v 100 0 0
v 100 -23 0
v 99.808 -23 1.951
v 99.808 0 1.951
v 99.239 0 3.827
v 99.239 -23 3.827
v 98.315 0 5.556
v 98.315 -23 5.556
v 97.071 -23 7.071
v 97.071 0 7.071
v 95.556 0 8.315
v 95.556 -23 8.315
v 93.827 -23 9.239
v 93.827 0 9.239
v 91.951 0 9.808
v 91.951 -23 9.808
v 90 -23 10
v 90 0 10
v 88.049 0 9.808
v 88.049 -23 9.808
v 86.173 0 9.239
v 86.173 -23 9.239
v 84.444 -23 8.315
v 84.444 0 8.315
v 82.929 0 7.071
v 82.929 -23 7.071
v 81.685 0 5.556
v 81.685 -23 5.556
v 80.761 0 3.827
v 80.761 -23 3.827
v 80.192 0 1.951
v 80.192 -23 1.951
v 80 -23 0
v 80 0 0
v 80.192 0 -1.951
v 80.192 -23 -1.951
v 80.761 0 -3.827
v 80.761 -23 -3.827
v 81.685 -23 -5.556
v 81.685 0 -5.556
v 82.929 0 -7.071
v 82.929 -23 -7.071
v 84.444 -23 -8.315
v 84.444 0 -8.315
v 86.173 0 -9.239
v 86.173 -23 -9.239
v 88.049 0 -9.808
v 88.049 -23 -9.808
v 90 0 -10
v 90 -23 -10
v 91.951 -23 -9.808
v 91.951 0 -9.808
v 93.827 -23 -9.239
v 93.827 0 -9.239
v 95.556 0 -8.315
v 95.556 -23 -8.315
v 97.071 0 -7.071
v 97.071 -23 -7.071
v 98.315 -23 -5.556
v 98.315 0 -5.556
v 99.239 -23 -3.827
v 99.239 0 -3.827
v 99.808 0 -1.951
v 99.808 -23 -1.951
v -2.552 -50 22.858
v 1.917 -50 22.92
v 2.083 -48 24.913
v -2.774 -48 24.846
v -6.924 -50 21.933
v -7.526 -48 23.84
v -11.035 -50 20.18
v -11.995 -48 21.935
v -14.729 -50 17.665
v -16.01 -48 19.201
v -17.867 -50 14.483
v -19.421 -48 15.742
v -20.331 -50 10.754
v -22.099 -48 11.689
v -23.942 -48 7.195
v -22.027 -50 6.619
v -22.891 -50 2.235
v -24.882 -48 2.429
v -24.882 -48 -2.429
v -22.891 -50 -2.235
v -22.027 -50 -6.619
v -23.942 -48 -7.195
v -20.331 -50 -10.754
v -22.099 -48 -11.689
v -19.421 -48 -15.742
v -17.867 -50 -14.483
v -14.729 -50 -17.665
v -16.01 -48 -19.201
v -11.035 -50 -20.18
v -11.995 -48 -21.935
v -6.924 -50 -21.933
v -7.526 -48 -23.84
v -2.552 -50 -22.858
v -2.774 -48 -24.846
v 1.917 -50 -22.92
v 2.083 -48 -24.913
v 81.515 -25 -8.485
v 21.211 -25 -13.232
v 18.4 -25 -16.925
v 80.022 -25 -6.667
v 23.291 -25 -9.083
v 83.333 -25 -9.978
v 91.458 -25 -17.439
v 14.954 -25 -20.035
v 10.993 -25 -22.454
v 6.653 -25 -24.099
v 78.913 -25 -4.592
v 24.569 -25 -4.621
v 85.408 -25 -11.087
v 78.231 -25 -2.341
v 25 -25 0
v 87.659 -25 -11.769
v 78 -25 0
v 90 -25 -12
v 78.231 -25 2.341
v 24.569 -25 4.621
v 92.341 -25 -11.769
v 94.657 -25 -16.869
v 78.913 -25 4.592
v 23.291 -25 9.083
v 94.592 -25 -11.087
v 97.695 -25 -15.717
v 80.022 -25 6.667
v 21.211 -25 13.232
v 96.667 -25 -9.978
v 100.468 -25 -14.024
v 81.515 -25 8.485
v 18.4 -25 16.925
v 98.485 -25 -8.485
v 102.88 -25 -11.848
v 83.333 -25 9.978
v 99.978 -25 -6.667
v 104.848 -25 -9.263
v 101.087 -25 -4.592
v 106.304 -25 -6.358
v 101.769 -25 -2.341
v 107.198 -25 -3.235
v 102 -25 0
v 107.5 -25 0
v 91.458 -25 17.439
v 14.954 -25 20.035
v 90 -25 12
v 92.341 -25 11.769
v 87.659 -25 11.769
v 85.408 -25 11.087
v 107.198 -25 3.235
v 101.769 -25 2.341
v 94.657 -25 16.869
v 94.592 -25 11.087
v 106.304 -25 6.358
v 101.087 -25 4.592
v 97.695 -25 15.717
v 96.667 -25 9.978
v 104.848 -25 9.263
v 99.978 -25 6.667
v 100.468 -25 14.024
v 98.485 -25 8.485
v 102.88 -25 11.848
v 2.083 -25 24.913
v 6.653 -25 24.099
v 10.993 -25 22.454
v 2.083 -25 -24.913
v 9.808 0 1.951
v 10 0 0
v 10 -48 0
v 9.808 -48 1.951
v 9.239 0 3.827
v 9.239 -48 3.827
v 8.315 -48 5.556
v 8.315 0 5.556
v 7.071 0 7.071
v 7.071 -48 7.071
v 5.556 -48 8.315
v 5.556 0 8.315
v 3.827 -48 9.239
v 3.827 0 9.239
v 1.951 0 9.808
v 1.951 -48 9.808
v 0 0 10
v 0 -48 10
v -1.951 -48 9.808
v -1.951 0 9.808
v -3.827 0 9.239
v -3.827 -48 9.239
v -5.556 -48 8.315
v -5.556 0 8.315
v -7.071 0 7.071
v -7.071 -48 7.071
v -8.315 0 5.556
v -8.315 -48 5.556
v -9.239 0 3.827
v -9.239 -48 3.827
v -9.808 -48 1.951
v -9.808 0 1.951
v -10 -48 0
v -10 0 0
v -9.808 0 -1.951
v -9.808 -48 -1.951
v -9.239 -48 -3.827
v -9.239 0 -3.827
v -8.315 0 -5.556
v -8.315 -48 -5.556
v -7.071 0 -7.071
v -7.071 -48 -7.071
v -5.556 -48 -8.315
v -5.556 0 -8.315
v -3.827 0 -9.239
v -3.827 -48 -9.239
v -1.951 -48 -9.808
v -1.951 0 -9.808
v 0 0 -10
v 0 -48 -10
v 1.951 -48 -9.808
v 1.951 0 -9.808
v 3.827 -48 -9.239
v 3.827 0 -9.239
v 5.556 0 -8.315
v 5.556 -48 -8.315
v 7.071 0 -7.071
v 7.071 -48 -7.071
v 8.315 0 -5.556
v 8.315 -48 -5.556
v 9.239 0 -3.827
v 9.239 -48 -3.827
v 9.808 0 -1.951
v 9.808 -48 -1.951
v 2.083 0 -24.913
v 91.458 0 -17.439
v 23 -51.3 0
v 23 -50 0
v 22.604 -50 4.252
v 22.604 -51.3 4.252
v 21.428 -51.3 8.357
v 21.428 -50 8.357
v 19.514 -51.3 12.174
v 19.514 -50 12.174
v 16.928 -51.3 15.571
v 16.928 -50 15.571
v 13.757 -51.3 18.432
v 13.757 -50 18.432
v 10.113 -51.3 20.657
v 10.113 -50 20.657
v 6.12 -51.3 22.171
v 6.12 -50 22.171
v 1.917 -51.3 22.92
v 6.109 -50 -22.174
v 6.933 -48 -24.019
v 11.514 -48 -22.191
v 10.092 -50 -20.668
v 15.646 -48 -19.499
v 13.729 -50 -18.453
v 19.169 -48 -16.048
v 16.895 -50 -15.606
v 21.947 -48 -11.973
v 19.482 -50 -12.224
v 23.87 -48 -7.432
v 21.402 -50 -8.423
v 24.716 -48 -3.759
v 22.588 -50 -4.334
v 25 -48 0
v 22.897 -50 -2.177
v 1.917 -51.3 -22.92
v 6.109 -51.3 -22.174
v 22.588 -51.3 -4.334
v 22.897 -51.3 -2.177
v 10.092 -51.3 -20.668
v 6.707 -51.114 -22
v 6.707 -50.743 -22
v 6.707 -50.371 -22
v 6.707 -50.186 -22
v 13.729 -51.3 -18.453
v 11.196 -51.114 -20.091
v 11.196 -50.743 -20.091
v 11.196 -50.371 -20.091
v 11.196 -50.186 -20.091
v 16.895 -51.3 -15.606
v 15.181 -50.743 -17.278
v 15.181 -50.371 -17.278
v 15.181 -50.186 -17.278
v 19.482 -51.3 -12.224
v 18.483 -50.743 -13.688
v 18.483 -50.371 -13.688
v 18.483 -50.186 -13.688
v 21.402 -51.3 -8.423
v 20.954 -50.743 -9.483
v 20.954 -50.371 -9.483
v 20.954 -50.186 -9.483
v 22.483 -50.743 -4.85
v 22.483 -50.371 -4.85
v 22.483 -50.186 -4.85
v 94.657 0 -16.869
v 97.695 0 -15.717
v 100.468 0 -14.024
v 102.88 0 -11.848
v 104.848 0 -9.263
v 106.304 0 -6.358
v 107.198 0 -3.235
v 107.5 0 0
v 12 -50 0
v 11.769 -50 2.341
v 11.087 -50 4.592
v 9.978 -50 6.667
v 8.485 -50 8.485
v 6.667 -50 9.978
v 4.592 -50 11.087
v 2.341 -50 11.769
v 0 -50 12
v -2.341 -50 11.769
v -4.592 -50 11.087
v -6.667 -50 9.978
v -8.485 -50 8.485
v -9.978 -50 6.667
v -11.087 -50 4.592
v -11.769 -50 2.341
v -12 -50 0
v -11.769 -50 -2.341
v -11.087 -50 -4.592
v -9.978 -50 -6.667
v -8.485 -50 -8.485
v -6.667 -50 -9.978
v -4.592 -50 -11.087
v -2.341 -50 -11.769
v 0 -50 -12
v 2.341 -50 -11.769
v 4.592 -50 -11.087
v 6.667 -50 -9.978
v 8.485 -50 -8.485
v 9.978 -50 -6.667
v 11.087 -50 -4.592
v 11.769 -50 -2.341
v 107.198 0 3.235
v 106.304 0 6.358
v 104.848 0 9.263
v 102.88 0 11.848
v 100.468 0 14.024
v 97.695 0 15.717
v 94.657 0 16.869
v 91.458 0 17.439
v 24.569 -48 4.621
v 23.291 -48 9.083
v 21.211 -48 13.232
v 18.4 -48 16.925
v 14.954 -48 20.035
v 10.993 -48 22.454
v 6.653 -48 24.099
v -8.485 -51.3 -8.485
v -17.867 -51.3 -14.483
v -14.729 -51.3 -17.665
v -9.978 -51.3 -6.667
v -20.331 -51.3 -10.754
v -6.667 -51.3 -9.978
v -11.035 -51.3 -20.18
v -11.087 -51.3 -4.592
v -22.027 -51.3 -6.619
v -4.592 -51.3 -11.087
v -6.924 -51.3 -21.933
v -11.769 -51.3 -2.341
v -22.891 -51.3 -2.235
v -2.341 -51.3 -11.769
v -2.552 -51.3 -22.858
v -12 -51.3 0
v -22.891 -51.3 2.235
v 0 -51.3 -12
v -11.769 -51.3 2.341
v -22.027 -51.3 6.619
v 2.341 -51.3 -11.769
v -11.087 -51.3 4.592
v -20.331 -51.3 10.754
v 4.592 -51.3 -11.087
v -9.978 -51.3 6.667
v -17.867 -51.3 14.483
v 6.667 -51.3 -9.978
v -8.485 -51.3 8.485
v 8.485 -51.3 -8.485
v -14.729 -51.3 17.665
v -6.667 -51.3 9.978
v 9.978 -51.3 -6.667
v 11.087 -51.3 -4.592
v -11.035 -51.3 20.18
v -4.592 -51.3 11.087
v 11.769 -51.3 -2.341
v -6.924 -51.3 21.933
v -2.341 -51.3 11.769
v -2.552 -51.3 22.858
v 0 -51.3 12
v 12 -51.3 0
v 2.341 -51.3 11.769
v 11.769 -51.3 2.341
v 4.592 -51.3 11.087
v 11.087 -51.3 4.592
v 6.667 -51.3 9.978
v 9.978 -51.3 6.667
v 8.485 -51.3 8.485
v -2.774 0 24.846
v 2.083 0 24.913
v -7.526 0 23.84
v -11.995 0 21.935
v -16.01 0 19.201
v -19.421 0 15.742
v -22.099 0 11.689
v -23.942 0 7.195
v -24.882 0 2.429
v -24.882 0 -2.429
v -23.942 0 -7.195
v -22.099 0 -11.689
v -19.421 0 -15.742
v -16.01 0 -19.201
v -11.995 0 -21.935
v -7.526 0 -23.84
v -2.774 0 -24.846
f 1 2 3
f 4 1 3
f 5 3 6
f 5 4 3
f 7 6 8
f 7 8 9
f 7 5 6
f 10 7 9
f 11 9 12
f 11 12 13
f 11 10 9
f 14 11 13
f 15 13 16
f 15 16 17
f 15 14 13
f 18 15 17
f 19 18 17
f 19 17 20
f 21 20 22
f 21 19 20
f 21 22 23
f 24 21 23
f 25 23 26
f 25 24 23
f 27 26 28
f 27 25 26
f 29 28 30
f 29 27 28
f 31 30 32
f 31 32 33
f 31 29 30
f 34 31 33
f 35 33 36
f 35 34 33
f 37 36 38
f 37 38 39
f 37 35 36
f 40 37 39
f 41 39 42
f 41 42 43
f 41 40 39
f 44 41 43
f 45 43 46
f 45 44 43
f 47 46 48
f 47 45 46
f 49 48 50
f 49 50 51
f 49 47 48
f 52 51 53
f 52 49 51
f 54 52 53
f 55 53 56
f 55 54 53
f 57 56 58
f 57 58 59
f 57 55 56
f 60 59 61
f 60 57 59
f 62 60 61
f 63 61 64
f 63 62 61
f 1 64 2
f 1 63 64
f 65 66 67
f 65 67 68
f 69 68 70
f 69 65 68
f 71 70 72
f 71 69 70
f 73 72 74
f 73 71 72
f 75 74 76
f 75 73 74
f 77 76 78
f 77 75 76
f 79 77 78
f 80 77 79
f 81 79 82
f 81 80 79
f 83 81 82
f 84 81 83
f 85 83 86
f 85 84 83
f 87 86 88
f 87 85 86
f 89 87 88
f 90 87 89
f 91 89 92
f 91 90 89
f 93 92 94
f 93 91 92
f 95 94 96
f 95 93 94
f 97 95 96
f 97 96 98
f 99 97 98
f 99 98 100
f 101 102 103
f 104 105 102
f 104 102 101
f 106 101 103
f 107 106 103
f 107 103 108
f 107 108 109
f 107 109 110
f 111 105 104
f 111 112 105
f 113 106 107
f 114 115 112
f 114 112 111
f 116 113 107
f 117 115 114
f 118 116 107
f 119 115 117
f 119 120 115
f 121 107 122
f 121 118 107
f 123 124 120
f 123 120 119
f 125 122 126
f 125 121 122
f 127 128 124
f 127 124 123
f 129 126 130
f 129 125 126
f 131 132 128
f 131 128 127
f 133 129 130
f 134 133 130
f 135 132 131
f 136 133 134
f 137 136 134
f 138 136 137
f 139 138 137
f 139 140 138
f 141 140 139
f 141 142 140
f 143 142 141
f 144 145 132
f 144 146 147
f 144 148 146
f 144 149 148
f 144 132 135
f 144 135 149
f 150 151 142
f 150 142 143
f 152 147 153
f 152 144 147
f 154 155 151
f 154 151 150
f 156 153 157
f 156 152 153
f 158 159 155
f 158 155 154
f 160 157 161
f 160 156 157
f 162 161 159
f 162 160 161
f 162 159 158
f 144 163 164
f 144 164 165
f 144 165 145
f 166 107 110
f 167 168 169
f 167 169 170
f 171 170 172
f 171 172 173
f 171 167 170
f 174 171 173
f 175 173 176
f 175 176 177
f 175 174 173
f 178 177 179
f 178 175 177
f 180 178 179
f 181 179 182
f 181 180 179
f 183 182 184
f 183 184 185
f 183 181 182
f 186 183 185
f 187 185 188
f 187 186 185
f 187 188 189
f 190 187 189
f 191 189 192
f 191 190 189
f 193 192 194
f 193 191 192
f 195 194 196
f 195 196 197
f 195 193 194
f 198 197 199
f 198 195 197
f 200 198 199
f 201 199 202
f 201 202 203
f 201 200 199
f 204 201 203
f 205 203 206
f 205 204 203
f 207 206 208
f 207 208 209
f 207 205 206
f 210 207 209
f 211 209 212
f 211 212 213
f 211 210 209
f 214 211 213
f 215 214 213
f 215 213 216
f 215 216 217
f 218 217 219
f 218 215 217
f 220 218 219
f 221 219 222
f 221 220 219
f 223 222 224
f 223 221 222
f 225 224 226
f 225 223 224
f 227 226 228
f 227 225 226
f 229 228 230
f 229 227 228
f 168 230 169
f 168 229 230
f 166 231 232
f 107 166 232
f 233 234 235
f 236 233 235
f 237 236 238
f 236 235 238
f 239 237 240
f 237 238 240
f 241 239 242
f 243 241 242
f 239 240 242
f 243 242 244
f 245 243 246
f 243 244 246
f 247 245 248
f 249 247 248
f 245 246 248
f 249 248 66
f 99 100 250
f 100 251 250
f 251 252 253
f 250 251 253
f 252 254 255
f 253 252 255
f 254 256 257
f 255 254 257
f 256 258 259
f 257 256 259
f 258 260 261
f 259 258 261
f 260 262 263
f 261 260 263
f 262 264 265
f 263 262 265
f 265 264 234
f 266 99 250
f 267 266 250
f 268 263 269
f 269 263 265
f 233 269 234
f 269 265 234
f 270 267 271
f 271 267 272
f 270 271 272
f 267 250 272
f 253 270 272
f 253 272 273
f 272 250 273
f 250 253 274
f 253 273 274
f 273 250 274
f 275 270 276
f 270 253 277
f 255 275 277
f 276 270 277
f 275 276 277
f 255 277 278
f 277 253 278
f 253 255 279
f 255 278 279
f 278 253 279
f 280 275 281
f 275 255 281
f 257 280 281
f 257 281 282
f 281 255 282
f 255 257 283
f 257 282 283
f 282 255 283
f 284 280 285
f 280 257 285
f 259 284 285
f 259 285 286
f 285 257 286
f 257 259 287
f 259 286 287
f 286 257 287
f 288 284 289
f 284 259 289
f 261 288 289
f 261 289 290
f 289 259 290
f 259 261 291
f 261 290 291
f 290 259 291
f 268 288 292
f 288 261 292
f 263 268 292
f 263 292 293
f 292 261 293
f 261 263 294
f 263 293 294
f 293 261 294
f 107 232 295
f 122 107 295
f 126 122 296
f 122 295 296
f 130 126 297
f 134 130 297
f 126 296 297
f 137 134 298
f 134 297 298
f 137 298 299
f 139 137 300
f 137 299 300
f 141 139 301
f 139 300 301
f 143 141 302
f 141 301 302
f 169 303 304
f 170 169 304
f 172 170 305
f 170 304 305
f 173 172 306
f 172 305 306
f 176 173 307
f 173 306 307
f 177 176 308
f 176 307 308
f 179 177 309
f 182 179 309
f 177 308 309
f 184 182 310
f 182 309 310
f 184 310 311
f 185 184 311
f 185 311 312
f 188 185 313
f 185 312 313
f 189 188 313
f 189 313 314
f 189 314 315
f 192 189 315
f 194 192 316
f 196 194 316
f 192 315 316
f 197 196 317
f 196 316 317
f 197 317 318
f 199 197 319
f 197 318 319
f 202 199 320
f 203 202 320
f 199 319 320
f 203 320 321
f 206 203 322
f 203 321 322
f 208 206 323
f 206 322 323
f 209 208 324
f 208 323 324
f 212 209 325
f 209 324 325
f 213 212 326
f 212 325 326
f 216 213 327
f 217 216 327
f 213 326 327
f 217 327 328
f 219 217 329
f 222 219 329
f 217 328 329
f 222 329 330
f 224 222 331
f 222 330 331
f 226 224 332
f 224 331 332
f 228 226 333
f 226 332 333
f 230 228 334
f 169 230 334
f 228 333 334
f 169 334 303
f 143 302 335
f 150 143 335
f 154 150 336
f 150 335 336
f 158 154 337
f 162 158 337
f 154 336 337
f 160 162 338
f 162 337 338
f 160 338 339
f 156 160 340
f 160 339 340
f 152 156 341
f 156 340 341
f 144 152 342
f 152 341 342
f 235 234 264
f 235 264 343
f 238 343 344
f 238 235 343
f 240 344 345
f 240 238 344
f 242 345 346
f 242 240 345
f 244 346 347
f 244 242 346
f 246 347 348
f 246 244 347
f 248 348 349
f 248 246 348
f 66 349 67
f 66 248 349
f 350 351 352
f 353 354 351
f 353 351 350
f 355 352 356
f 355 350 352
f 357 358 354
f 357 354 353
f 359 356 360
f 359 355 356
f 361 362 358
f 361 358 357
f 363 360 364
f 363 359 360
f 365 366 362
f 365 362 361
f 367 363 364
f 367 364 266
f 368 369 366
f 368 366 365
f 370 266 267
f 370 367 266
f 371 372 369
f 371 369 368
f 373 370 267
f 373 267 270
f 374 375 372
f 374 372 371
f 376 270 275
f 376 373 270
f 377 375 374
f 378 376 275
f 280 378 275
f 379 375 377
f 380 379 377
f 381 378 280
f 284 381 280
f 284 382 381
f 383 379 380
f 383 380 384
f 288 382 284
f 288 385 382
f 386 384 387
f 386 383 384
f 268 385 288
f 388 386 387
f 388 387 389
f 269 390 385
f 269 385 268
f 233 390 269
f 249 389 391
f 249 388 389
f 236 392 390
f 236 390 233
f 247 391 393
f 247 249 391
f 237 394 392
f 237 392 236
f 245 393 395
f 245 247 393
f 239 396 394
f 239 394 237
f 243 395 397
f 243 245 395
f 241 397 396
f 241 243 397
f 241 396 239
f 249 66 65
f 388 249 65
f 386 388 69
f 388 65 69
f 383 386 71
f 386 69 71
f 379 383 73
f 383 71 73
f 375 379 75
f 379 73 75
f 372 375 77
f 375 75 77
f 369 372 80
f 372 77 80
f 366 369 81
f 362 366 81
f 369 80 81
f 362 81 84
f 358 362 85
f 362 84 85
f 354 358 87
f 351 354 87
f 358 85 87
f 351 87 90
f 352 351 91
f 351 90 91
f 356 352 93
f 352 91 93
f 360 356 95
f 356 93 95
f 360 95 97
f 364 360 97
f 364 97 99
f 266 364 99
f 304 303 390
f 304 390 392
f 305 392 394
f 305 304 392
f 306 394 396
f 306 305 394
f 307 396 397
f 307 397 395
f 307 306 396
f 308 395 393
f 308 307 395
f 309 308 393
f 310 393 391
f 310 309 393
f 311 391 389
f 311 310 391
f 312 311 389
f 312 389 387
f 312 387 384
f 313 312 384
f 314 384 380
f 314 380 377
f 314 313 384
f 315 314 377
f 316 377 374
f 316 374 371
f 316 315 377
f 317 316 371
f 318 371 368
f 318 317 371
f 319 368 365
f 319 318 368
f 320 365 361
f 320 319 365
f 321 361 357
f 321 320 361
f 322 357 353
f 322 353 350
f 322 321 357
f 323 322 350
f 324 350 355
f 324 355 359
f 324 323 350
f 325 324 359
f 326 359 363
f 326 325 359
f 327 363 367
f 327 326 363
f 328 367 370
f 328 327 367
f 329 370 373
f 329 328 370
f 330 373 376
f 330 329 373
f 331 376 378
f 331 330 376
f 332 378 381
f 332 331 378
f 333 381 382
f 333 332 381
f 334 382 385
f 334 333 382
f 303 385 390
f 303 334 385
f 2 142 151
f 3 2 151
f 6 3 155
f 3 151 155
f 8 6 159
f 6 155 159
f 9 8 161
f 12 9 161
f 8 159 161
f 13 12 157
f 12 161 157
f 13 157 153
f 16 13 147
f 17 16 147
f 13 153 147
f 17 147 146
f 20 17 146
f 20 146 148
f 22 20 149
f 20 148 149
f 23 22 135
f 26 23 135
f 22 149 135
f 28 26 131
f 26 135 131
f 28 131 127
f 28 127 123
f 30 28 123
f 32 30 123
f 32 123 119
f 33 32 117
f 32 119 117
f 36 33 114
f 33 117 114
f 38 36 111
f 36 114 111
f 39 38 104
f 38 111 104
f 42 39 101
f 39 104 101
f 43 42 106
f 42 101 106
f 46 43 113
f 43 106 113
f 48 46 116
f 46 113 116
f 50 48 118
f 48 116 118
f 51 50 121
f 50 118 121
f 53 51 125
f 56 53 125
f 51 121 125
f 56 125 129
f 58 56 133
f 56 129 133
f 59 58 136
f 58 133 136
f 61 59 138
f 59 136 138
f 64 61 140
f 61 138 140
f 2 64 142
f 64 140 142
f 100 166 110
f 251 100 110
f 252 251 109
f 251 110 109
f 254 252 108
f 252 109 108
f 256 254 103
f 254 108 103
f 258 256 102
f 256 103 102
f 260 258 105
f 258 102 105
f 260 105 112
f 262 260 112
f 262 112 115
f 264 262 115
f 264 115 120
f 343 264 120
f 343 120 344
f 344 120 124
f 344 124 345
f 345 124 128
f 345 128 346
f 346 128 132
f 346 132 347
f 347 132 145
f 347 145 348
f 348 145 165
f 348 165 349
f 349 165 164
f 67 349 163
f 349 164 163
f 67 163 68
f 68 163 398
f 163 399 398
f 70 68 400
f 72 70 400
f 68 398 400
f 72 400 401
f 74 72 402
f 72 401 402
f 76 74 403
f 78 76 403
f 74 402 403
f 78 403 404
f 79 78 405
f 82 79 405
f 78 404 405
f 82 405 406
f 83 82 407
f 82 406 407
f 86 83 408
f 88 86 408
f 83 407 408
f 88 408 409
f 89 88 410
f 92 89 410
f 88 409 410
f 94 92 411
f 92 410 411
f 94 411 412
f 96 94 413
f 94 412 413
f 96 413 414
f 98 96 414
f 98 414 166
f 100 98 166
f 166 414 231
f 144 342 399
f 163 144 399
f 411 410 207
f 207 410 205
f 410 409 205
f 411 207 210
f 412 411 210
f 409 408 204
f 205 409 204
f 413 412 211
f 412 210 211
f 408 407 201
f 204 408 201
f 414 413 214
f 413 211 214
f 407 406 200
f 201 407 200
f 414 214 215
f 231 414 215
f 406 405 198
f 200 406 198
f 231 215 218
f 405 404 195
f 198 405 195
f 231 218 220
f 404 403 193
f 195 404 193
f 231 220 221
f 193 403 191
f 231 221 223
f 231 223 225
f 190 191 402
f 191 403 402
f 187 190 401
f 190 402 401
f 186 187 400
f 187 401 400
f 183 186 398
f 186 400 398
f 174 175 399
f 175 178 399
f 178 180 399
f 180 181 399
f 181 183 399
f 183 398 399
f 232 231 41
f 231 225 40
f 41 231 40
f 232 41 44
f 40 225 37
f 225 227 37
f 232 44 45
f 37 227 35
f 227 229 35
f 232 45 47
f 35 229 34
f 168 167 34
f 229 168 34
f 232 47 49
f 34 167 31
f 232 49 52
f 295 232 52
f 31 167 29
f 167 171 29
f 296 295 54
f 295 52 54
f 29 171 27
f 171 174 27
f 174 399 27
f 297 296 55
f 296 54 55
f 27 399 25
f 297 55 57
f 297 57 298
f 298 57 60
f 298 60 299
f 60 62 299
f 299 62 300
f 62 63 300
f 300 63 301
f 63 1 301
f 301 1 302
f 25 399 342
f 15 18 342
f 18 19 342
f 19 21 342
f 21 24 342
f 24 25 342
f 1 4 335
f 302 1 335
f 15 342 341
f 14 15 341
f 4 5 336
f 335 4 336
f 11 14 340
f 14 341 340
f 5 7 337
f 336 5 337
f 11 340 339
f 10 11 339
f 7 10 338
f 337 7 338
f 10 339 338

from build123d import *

# Parameters (mm, degrees)
F0_R     = 10
F1_DEPTH = 25
F2_DEPTH = 50
F3_SIZE  = 2
F4_DEPTH = 1.3


with BuildPart() as f1:
    # F0 (on Front) → F1 (new body)
    with BuildSketch(Plane.XZ):
        with BuildLine():
            ThreePointArc((2.0833333333, -24.9130432148), (18.3995018048, -16.9250800097), (25, 0))
            ThreePointArc((25, 0), (18.3995018048, 16.9250800097), (2.0833333333, 24.9130432148))
            ThreePointArc((2.0833333333, 24.9130432148), (-25, 0), (2.0833333333, -24.9130432148))
        make_face()
        Circle(F0_R, mode=Mode.SUBTRACT)
        with BuildLine():
            ThreePointArc((2.0833333333, 24.9130432148), (18.3995018048, 16.9250800097), (25, 0))
            ThreePointArc((25, 0), (18.3995018048, -16.9250800097), (2.0833333333, -24.9130432148))
            Line((2.0833333333, -24.9130432148), (91.4583333333, -17.4391302504))
            ThreePointArc((91.4583333333, -17.4391302504), (72.5, 0), (91.4583333333, 17.4391302504))
            Line((91.4583333333, 17.4391302504), (2.0833333333, 24.9130432148))
        make_face()
        with BuildLine():
            ThreePointArc((107.5, 0), (102.8796512634, 11.8475560068), (91.4583333333, 17.4391302504))
            ThreePointArc((91.4583333333, 17.4391302504), (72.5, 0), (91.4583333333, -17.4391302504))
            ThreePointArc((91.4583333333, -17.4391302504), (102.8796512634, -11.8475560068), (107.5, 0))
        make_face()
        with Locations((90, 0)):
            Circle(F0_R, mode=Mode.SUBTRACT)
    extrude(amount=F1_DEPTH)

    # F0 (on Front) → F2 (join)
    with BuildSketch(Plane.XZ):
        with BuildLine():
            ThreePointArc((2.0833333333, -24.9130432148), (18.3995018048, -16.9250800097), (25, 0))
            ThreePointArc((25, 0), (18.3995018048, 16.9250800097), (2.0833333333, 24.9130432148))
            ThreePointArc((2.0833333333, 24.9130432148), (-25, 0), (2.0833333333, -24.9130432148))
        make_face()
        Circle(F0_R, mode=Mode.SUBTRACT)
    extrude(amount=F2_DEPTH)

    # F3
    f3_edges = [f1.edges().sort_by_distance(p)[0] for p in [
        (-2.083333, -50, 24.913043),
        (-10, -50, 0),
        (80, -25, 0),
    ]]
    chamfer(f3_edges, length=F3_SIZE)

    # F4 (add): a face of the model
    f4_faces = [f1.faces().sort_by_distance(p)[0] for p in [
        (-1.8624551468, -50, 22.2717242675),
    ]]
    extrude(f4_faces, amount=F4_DEPTH)


solid = f1.part
